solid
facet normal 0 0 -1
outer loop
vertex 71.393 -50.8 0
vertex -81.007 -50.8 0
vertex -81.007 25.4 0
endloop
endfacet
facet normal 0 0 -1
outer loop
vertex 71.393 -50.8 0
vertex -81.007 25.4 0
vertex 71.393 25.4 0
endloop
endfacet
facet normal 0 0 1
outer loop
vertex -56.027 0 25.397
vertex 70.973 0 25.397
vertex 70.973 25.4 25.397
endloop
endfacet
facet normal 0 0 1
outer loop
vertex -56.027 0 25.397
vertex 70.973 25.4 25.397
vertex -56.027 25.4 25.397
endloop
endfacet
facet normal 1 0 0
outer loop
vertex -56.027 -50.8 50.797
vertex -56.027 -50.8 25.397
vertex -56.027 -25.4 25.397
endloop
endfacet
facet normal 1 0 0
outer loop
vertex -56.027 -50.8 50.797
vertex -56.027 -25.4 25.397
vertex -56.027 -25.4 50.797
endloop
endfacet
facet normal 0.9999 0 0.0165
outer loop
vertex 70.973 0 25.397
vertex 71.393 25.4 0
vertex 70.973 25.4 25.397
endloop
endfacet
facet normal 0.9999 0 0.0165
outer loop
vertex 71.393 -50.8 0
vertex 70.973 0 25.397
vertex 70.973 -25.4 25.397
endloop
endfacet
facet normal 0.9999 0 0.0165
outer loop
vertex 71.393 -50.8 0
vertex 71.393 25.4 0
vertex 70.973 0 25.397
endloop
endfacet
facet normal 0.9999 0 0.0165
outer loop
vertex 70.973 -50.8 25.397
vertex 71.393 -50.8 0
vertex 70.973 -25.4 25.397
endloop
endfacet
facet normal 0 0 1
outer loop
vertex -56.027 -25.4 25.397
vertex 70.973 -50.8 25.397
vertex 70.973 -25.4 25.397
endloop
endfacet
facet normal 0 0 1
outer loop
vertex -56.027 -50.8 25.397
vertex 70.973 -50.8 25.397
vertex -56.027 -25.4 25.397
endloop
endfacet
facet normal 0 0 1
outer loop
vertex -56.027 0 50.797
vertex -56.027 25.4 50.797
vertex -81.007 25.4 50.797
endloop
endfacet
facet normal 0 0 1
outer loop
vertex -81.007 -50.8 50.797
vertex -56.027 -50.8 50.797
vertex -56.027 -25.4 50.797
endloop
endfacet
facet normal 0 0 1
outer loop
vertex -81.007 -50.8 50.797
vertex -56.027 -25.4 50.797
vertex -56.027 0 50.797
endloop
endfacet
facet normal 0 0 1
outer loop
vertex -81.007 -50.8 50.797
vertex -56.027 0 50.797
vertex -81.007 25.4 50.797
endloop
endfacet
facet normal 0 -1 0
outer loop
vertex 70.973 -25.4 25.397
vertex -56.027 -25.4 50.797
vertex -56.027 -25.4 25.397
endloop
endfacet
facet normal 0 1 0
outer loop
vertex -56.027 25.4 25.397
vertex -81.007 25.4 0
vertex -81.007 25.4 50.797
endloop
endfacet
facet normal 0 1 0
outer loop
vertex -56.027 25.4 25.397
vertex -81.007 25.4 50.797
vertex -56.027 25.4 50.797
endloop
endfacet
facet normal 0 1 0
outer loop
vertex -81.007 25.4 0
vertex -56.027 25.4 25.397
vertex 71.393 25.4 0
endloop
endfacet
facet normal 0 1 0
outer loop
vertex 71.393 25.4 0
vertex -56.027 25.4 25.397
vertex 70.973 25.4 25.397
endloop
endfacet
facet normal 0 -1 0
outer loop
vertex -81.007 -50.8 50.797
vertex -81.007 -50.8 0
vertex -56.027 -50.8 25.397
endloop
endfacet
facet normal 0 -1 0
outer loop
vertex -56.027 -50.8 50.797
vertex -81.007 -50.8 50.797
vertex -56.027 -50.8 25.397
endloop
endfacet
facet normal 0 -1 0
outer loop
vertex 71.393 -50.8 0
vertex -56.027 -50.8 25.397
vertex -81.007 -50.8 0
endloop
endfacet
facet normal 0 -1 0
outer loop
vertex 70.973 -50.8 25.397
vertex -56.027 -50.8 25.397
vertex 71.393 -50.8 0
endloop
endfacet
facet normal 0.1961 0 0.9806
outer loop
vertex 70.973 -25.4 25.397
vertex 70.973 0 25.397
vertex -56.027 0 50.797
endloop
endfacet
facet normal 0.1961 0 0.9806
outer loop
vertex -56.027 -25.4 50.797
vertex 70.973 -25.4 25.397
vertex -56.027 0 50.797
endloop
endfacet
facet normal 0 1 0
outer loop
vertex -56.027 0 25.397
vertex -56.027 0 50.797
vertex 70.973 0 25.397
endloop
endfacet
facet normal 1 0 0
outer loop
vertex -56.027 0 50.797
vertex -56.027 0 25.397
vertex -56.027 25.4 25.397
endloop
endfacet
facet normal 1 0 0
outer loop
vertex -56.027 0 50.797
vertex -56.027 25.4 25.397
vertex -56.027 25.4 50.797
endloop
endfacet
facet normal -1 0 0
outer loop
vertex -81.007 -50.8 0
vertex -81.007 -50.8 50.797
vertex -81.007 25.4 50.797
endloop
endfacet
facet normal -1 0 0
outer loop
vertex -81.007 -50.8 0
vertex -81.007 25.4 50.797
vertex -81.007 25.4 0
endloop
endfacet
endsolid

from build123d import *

# Parameters (mm, degrees)
F1_DEPTH      = 50.8
F1_DEPTH_BACK = 25.4
F2_DEPTH      = 25.4


with BuildPart() as f1:
    # F0 (on Front) → F1 (new body, two sides)
    with BuildSketch(Plane.XZ) as f1_sk:
        Polygon((-56.026979, 25.396531), (-56.026979, 50.796531), (-81.007203, 50.796531), (-81.007203, 0), (71.392797, 0), (70.973021, 25.396531), align=None)
    extrude(amount=F1_DEPTH)
    extrude(f1_sk.sketch, amount=-F1_DEPTH_BACK)

    # F0 (on Front) → F2 (join)
    with BuildSketch(Plane.XZ):
        Polygon((70.973021, 25.396531), (-56.026979, 50.796531), (-56.026979, 25.396531), align=None)
    extrude(amount=F2_DEPTH)


solid = f1.part
